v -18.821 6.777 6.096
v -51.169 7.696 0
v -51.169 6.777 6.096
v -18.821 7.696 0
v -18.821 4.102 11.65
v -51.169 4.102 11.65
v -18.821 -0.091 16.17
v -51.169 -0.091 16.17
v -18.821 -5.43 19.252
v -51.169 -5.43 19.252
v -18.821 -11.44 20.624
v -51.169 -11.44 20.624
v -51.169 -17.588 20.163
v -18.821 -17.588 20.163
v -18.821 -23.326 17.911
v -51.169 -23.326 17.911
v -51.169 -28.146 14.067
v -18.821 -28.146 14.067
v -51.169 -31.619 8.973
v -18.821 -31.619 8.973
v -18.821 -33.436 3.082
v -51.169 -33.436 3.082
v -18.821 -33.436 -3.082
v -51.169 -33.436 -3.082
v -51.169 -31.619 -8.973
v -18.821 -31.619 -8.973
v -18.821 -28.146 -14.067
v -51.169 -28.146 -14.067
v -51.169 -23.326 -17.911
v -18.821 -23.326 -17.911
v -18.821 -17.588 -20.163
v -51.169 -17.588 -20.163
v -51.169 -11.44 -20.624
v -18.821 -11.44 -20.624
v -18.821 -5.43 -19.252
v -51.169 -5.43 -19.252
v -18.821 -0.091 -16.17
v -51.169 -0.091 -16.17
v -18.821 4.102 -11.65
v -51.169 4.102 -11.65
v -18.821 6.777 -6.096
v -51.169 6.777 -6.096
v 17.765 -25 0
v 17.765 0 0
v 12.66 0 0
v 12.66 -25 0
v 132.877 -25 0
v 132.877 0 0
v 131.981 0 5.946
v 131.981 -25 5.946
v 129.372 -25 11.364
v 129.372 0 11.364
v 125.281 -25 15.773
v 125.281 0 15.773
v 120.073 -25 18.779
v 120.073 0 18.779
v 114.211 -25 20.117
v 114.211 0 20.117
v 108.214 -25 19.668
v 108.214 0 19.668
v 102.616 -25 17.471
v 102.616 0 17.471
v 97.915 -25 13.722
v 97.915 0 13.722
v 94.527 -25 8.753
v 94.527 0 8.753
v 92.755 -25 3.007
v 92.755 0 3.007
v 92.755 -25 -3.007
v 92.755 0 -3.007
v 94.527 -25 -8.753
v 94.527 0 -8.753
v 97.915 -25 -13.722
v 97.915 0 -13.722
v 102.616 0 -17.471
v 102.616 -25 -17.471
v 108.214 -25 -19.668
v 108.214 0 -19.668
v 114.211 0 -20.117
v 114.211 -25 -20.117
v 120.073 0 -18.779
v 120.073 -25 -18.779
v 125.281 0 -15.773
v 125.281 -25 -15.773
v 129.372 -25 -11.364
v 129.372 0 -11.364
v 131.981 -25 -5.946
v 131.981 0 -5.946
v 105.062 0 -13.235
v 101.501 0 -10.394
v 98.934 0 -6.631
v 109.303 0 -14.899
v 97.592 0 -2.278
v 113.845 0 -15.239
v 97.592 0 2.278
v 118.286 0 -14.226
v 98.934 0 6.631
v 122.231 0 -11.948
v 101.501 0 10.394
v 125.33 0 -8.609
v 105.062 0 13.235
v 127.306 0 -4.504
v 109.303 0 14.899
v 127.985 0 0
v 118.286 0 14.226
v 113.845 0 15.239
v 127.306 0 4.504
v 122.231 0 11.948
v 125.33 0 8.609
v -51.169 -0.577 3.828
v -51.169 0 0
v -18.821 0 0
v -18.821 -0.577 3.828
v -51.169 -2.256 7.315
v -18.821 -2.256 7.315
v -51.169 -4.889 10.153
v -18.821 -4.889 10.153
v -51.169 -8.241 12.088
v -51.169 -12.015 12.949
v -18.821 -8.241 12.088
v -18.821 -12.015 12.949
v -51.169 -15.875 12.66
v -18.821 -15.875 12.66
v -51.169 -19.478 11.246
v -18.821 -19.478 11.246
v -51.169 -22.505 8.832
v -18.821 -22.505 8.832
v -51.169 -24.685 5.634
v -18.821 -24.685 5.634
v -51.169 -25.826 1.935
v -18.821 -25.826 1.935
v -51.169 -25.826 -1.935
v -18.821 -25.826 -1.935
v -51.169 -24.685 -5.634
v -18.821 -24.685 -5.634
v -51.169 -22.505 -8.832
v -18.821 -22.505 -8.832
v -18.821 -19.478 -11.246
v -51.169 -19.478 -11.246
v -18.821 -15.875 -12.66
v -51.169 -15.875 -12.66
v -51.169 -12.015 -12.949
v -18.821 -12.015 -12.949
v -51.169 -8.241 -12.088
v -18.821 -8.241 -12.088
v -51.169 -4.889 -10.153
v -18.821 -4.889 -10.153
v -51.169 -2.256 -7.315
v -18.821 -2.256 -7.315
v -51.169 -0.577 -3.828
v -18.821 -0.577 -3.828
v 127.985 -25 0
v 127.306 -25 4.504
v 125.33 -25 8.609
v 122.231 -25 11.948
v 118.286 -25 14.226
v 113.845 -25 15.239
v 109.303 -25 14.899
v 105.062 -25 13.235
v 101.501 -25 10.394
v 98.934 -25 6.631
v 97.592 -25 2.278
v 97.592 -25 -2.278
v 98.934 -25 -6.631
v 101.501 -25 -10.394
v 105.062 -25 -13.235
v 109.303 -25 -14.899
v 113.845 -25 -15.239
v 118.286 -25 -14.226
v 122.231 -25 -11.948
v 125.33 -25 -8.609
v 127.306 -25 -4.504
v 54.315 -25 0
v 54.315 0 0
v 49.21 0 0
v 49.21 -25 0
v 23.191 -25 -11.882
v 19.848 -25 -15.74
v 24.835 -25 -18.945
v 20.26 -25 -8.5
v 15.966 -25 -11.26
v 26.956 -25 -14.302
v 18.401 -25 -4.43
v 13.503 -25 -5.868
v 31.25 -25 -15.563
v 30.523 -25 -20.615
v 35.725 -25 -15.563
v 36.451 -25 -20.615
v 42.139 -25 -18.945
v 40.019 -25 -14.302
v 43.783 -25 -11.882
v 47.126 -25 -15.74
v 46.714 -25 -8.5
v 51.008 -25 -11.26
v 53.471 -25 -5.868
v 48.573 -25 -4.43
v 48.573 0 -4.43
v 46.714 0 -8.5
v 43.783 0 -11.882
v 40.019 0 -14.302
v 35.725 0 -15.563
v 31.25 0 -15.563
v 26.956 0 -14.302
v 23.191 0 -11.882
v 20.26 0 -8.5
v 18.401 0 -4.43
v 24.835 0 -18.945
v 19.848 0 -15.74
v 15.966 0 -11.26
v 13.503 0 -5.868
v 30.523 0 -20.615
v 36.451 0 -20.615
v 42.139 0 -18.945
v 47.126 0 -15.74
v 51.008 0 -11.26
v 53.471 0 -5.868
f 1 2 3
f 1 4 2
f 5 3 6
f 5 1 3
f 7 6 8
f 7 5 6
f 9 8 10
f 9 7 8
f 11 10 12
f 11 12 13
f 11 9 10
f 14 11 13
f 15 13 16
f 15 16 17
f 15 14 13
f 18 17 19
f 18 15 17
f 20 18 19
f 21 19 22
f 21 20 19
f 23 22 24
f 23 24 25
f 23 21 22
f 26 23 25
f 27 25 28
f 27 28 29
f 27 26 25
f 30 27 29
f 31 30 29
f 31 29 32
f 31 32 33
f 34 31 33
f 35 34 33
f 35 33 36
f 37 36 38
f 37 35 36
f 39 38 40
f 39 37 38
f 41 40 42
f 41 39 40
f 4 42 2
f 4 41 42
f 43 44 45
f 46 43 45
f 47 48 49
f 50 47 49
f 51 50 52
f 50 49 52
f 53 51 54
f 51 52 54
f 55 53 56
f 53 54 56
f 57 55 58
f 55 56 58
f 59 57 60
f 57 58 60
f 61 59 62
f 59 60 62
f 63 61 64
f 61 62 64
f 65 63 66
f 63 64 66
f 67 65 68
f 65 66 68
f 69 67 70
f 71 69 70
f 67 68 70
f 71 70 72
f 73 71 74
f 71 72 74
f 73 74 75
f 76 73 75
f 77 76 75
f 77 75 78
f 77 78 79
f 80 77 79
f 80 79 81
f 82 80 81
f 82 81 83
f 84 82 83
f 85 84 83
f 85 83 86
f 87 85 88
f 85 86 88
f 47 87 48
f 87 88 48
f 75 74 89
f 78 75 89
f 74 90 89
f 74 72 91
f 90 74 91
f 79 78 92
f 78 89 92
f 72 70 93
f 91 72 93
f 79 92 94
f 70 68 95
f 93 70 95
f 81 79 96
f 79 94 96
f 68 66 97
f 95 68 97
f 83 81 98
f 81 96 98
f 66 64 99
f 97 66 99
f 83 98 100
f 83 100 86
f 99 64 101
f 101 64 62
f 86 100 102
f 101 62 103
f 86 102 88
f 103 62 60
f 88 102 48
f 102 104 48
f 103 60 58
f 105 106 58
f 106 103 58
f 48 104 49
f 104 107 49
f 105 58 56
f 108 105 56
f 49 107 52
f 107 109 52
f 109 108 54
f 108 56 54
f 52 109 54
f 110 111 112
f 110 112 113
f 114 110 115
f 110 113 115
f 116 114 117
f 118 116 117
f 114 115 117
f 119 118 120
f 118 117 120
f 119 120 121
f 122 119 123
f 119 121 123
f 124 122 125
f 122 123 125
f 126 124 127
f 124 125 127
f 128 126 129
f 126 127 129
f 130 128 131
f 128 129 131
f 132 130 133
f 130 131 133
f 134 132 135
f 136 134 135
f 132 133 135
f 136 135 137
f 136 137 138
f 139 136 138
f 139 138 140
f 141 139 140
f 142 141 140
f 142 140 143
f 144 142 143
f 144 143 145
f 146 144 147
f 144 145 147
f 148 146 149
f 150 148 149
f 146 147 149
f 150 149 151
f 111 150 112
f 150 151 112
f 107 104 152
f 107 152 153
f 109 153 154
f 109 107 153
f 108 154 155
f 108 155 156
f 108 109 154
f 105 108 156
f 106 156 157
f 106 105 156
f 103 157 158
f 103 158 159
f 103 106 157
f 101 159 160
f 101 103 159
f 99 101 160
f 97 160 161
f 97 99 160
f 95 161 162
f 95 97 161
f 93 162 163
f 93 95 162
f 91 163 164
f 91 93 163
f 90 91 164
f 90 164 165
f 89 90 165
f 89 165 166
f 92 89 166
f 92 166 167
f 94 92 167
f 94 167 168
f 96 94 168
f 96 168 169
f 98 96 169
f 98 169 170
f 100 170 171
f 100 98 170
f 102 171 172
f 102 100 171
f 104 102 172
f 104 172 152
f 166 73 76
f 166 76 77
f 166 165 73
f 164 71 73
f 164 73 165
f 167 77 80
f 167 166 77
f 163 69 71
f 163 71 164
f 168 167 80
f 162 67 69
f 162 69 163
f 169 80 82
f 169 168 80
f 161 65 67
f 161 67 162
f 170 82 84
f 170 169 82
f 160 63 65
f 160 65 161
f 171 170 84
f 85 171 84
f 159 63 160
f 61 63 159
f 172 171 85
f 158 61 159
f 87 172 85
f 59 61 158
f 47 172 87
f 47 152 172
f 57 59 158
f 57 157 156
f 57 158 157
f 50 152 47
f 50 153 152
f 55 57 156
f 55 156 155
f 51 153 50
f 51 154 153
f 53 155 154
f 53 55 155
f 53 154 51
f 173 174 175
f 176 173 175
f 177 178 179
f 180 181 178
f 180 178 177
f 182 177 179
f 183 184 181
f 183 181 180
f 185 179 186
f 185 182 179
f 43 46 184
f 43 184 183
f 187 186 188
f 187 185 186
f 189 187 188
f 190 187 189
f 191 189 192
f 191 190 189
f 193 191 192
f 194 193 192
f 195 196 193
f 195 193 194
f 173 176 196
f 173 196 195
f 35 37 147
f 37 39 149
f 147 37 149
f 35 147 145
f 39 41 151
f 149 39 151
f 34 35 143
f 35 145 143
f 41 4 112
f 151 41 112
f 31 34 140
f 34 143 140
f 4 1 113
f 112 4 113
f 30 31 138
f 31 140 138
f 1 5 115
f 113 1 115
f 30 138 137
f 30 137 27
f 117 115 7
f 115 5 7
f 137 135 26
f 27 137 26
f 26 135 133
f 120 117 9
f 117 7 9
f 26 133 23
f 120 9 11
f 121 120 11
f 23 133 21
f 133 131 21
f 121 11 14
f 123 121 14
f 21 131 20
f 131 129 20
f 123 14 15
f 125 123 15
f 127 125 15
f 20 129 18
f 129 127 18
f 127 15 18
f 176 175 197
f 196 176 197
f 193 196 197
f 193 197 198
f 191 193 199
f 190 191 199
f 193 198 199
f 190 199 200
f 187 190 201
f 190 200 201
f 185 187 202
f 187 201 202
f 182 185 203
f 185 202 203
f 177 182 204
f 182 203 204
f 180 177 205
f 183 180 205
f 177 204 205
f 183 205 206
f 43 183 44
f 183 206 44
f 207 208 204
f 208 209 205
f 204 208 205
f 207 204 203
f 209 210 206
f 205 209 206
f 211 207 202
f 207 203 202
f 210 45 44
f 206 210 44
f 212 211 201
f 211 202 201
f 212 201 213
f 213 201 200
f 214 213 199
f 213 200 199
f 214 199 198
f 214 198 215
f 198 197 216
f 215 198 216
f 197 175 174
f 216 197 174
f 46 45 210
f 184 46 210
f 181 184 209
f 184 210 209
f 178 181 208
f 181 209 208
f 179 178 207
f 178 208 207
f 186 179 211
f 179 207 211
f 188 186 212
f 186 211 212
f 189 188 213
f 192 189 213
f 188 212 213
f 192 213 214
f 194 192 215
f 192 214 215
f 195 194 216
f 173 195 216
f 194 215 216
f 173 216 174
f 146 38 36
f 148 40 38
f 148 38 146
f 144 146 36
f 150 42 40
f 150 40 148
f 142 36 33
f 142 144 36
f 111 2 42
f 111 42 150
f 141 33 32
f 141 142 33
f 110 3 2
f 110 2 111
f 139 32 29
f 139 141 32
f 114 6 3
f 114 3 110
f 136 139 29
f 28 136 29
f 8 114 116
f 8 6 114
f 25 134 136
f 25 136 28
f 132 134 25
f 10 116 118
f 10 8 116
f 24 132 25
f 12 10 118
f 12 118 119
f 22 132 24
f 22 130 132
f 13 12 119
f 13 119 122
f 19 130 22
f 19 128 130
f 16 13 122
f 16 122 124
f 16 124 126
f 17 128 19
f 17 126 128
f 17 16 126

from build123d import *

# Parameters (mm, degrees)
F0_W     = 32.3487
F0_H     = 7.696051
F3_DEPTH = 25
F4_R     = 20.173866
F4_R_2   = 15.282004
F5_DEPTH = 25


with BuildPart() as f1:
    # F0 (on Top) → F1 (revolve)
    with BuildSketch(Plane.XY):
        with Locations((-34.994926, 3.848025)):
            Rectangle(F0_W, F0_H)
    revolve(axis=Axis((-34.709183, -12.985609, 0), (1, 0, 0)))


with BuildPart() as f3:
    # F2 (on Front) → F3 (new body)
    with BuildSketch(Plane.XZ):
        with BuildLine():
            ThreePointArc((12.659758, 0), (33.487156, -20.827398), (54.314554, 0))
            Line((54.314554, 0), (49.209803, 0))
            ThreePointArc((49.209803, 0), (33.487156, -15.722647), (17.764509, 0))
            Line((17.764509, 0), (12.659758, 0))
        make_face()
    extrude(amount=F3_DEPTH)


with BuildPart() as f5:
    # F4 (on Front) → F5 (new body)
    with BuildSketch(Plane.XZ):
        with Locations((112.703085, 0)):
            Circle(F4_R)
        with Locations((112.703085, 0)):
            Circle(F4_R_2, mode=Mode.SUBTRACT)
    extrude(amount=F5_DEPTH)


solid = Compound([f1.part, f3.part, f5.part])
